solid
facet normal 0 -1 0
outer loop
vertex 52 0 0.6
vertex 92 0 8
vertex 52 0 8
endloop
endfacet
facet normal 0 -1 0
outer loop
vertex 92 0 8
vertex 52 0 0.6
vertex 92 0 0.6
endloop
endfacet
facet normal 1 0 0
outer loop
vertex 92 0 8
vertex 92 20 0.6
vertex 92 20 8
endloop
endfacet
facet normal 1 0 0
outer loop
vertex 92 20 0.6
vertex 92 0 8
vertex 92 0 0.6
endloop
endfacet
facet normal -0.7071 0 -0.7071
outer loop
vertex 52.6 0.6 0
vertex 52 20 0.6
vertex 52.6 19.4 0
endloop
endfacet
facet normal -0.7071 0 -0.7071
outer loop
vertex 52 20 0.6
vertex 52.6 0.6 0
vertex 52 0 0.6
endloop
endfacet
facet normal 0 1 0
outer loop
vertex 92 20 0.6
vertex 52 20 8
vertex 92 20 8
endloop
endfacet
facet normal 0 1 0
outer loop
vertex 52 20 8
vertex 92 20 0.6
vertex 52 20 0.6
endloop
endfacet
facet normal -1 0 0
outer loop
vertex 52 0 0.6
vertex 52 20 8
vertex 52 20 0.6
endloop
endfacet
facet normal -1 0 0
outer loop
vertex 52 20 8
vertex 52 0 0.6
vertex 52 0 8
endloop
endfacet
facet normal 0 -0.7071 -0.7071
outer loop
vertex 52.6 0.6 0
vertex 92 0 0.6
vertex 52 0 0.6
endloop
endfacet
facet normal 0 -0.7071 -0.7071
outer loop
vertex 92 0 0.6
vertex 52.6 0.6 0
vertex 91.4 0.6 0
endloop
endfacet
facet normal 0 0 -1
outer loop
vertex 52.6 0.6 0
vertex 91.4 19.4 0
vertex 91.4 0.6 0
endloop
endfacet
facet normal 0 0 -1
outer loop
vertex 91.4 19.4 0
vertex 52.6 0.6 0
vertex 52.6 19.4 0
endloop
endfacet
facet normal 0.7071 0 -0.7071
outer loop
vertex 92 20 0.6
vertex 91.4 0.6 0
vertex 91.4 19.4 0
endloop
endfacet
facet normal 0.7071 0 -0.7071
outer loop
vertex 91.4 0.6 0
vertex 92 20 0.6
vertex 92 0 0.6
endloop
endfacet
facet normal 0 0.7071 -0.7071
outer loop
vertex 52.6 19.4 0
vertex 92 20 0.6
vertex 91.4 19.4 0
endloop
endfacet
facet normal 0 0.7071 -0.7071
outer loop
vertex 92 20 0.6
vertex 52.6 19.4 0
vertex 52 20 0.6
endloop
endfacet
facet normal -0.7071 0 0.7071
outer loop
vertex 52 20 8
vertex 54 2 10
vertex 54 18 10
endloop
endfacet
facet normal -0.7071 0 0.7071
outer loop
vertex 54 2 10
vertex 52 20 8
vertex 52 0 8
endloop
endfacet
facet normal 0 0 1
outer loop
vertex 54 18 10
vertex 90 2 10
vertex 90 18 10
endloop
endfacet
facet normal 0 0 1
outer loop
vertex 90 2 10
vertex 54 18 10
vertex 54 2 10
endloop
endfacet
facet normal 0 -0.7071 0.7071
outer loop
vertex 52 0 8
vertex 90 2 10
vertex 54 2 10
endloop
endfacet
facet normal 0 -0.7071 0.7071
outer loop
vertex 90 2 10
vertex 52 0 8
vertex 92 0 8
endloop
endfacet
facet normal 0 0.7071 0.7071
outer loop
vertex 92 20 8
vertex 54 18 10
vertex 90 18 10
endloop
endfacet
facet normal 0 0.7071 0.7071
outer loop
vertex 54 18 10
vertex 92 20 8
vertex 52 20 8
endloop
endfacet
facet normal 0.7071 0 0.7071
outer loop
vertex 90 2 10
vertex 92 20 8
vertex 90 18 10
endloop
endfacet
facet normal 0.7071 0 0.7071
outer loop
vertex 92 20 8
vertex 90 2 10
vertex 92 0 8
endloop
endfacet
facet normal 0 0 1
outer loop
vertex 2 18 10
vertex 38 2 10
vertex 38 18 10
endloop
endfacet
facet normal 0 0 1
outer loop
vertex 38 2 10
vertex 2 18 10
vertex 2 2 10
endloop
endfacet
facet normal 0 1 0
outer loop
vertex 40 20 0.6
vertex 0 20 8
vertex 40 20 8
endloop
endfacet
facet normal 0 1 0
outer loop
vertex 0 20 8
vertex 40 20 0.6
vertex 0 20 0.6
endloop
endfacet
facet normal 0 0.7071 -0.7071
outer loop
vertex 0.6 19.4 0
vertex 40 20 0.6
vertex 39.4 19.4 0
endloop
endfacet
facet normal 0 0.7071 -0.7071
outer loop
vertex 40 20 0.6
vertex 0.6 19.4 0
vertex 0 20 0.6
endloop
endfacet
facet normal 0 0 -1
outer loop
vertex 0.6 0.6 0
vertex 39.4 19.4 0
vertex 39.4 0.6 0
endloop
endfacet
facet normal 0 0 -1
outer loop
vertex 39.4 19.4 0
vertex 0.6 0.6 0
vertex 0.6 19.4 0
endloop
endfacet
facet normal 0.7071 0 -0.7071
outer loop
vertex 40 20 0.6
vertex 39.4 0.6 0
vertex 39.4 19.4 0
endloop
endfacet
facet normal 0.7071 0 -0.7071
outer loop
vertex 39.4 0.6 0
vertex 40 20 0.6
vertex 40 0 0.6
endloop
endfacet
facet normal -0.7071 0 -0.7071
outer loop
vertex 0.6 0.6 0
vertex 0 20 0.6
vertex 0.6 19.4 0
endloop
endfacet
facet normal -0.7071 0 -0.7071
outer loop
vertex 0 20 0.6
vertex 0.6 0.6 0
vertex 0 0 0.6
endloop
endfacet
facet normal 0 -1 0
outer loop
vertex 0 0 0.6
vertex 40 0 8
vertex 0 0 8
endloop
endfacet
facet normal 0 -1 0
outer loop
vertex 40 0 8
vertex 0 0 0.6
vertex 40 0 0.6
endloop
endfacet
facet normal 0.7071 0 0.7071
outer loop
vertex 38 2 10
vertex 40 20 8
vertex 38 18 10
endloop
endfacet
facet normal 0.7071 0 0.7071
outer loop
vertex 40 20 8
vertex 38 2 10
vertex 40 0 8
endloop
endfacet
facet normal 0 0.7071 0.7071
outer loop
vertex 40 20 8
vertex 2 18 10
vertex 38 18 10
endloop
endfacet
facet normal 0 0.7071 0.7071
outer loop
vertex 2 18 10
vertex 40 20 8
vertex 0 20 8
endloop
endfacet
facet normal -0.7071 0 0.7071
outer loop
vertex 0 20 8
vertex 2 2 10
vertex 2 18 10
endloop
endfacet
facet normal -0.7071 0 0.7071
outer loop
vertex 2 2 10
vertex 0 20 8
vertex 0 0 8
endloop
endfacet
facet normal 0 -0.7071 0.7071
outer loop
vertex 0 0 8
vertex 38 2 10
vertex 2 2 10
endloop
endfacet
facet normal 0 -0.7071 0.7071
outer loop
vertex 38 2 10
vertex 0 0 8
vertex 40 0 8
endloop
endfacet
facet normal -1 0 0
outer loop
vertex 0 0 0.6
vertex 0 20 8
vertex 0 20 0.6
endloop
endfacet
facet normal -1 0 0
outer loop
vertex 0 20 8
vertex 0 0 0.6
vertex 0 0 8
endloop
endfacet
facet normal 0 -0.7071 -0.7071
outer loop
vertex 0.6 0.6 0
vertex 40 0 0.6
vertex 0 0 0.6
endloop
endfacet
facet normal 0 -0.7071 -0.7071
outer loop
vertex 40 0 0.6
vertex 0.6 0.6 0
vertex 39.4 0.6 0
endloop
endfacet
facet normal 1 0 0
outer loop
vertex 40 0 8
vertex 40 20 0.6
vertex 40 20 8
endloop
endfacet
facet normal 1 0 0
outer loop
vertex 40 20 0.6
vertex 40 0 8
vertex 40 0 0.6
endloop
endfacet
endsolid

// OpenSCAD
// Experiment: can one hull form both an upper chamfer and elephant-foot relief?
// This is a deliberately CONVEX straight-arm test piece, not the full L bracket.
// The full bracket has a concave inside corner, a radius, end chamfers and
// captive-nut openings. Do not substitute this prototype for corner_bracket.scad.

/* [Experiment] */
view = "comparison"; // [comparison, combined, reference, xor, layers]
length = 40;
width = 20;
height = 10;
upper_chamfer = 2; // corresponds to cs (on the outer face)
elephant_foot = 0.6; // corresponds to ef (on the bottom contact face)
separation = 12;

/* [Hidden] */
eps = 0.001;
assert(length > 2 * max(upper_chamfer, elephant_foot));
assert(width > 2 * max(upper_chamfer, elephant_foot));
assert(height > upper_chamfer + elephant_foot + 4 * eps);

// A rectangular horizontal layer, inset equally from four sides.
// A tiny thickness makes this legal 3D input for hull().
module layer(z, inset) {
    translate([inset, inset, z])
        cube([length - 2 * inset, width - 2 * inset, eps]);
}

// All four outlines belong to ONE hull() operation.
// Bottom-to-middle slope = elephant-foot relief.
// Middle-to-top slope = upper chamfer.
// The intervening straight part remains at full size.
module combined_hull() {
    hull() {
        layer(0, elephant_foot);
        layer(elephant_foot, 0);
        layer(height - upper_chamfer - eps, 0);
        layer(height - eps, upper_chamfer);
    }
}

// Comparison reference: each section is separately lofted.
// This is independent of the single four-layer hull construction.
module reference_sections() {
    union() {
        hull() { layer(0, elephant_foot); layer(elephant_foot, 0); }
        hull() { layer(elephant_foot, 0); layer(height - upper_chamfer - eps, 0); }
        hull() { layer(height - upper_chamfer - eps, 0); layer(height - eps, upper_chamfer); }
    }
}

module symmetric_difference() {
    union() {
        difference() { combined_hull(); reference_sections(); }
        difference() { reference_sections(); combined_hull(); }
    }
}

if (view == "combined") combined_hull();
else if (view == "reference") reference_sections();
else if (view == "xor") symmetric_difference();
else if (view == "layers") {
    color("orange") layer(0, elephant_foot);
    color("gold") layer(elephant_foot, 0);
    color("cyan") layer(height - upper_chamfer - eps, 0);
    color("blue") layer(height - eps, upper_chamfer);
} else {
    color("steelblue") combined_hull();
    translate([length + separation, 0, 0]) color("orange") reference_sections();
}
